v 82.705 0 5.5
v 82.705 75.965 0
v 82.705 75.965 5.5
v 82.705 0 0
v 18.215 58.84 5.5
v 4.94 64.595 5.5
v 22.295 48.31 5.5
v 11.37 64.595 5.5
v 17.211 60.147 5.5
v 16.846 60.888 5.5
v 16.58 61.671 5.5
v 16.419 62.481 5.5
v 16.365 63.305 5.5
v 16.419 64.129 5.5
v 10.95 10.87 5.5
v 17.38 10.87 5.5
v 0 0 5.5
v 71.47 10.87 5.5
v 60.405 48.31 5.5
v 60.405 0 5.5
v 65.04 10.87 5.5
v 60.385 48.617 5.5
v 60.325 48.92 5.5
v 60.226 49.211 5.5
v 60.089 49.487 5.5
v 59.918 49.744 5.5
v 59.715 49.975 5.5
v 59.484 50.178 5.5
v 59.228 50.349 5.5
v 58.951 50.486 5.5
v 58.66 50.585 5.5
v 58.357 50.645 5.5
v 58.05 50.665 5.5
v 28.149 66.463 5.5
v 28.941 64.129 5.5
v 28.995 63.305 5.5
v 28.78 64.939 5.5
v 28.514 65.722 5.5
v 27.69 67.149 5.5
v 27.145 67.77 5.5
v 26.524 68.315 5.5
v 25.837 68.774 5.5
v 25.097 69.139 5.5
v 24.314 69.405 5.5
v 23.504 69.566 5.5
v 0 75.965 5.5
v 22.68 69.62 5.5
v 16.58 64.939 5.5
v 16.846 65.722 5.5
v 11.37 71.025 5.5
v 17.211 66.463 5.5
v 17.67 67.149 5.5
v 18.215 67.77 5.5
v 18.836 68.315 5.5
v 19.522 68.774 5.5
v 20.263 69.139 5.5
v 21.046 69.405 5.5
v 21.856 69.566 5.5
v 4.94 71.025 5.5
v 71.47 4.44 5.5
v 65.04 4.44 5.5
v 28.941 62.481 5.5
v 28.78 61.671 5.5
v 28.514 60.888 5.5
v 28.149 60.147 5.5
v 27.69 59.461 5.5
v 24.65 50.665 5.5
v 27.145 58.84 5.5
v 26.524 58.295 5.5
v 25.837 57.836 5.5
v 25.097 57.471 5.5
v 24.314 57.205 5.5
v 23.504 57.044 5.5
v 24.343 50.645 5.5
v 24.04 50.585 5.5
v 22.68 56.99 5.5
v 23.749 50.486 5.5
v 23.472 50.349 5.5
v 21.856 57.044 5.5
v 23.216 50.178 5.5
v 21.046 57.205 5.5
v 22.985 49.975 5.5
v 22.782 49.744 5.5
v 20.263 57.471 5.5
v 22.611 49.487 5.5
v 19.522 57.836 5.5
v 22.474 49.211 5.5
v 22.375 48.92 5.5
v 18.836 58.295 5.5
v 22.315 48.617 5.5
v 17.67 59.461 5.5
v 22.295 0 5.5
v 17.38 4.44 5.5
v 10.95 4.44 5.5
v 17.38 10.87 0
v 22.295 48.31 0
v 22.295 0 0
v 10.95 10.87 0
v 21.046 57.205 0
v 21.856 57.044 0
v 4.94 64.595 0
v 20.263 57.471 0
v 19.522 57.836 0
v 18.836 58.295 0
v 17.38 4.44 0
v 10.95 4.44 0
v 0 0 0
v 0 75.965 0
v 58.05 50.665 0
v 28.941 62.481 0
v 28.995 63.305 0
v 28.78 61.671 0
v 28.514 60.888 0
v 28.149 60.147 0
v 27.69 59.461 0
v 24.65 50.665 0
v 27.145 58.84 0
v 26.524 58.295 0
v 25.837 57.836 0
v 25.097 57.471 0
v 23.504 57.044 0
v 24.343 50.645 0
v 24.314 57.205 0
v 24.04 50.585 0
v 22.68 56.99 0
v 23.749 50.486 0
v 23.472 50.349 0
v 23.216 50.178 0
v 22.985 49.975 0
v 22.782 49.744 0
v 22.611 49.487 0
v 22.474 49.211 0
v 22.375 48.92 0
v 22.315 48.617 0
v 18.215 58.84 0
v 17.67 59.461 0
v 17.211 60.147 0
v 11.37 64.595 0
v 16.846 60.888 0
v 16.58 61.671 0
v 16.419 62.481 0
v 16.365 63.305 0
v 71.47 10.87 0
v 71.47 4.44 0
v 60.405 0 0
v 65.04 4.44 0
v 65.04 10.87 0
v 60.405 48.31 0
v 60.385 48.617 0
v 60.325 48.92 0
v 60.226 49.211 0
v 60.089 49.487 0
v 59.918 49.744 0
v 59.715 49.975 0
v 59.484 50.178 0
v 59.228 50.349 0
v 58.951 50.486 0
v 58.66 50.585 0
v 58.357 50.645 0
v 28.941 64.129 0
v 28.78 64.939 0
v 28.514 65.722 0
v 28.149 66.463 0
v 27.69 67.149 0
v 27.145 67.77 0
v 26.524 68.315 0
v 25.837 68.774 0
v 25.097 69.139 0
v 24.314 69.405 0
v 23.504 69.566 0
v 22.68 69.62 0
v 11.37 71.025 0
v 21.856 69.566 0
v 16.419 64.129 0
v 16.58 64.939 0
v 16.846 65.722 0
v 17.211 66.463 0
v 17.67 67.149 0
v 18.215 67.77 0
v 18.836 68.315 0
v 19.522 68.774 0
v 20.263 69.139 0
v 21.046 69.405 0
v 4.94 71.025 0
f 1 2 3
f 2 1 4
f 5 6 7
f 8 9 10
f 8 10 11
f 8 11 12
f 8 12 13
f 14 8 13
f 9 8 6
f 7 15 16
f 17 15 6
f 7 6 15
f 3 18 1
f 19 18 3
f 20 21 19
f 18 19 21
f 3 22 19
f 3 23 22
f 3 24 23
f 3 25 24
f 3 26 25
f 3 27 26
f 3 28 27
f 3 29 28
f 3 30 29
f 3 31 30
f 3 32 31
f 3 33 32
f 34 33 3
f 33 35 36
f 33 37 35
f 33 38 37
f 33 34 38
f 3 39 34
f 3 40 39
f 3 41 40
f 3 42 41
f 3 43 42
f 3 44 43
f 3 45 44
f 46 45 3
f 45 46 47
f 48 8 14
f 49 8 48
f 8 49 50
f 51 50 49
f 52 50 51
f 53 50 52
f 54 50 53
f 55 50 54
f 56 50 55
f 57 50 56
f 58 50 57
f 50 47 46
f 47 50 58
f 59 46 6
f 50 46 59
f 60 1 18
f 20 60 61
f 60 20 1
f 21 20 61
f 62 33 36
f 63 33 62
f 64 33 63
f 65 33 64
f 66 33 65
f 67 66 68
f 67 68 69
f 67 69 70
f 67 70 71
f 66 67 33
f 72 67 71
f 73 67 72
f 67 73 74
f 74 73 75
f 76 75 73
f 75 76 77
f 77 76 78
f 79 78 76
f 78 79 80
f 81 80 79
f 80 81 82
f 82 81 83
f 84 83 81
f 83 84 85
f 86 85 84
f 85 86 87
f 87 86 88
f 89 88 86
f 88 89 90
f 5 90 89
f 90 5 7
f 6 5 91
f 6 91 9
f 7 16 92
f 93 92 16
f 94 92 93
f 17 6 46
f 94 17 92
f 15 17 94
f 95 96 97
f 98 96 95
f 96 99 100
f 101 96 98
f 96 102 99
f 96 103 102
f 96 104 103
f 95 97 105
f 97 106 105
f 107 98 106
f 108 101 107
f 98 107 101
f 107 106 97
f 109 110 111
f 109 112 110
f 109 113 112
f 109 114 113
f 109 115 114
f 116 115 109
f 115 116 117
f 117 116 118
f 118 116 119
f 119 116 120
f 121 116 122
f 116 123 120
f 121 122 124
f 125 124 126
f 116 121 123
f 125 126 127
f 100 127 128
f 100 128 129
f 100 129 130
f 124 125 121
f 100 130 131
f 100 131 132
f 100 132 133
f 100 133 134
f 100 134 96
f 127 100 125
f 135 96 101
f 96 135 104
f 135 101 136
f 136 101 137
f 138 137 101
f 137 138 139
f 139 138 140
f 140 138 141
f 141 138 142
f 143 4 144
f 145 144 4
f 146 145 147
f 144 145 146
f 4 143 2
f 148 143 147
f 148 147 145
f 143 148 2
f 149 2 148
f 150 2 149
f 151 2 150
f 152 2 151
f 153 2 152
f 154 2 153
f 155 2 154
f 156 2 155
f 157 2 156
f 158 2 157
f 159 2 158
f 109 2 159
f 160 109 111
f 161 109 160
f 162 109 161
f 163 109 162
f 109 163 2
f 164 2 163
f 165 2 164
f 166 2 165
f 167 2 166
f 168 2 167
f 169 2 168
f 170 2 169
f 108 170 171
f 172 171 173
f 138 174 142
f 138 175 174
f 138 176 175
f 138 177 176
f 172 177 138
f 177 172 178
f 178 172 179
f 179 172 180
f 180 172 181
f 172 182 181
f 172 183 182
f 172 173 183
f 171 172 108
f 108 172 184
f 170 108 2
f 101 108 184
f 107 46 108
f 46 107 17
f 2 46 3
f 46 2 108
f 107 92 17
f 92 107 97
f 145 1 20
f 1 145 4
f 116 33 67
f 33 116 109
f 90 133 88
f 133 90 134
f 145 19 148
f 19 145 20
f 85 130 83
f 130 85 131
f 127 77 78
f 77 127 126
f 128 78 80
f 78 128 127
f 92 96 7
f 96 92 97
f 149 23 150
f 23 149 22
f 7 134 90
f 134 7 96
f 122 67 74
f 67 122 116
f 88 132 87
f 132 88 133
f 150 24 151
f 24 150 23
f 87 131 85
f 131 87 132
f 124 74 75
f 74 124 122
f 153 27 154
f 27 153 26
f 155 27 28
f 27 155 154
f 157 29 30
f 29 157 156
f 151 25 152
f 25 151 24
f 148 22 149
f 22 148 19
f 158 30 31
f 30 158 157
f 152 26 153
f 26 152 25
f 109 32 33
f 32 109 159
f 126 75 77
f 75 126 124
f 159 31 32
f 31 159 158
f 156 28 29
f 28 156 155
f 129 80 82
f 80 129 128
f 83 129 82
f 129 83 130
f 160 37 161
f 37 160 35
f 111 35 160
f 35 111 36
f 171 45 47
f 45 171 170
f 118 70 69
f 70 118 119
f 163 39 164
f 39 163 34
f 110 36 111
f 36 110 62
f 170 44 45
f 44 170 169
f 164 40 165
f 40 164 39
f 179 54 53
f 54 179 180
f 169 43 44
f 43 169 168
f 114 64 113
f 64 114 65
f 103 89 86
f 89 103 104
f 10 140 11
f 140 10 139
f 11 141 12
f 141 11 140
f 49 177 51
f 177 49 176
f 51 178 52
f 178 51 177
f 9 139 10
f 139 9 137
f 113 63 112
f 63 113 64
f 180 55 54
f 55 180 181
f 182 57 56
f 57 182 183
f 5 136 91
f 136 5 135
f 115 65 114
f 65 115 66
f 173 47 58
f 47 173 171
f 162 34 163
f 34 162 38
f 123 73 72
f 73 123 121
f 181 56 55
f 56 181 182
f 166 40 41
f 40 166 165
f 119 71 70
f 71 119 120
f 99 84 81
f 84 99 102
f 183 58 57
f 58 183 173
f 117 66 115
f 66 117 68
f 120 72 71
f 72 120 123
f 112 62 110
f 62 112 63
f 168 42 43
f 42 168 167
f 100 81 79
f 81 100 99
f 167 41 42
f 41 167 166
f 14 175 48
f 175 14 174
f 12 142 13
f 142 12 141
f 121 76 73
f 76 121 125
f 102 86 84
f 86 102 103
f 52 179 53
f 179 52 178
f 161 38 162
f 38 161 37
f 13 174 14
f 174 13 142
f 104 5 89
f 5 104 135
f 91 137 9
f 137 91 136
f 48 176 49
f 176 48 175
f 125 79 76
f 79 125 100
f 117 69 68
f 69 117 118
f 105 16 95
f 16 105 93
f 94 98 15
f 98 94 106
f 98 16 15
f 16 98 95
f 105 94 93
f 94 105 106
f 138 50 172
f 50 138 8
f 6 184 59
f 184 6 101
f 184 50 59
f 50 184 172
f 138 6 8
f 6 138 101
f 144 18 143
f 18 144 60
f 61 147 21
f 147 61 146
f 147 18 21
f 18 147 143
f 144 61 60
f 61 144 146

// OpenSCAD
// Generated by SolidPython 1.0.2 on 2020-10-18 22:38:26
$fn = 48;


color(c = [1, 1, 1, 0.2000000000]) {
	difference() {
		cube(size = [82.7050000000, 75.9650000000, 5.5000000000]);
		hull() {
			translate(v = [24.6500000000, -2.3550000000, -0.5000000000]) {
				cylinder(center = false, h = 6.5000000000, r = 2.3550000000);
			}
			translate(v = [58.0500000000, -2.3550000000, -0.5000000000]) {
				cylinder(center = false, h = 6.5000000000, r = 2.3550000000);
			}
			translate(v = [24.6500000000, 48.3100000000, -0.5000000000]) {
				cylinder(center = false, h = 6.5000000000, r = 2.3550000000);
			}
			translate(v = [58.0500000000, 48.3100000000, -0.5000000000]) {
				cylinder(center = false, h = 6.5000000000, r = 2.3550000000);
			}
		}
		translate(v = [22.6800000000, 63.3050000000, -0.5000000000]) {
			cylinder(center = false, d = 12.6300000000, h = 6.5000000000);
		}
		translate(v = [10.9500000000, 4.4400000000, -0.0500000000]) {
			cube(size = [6.4300000000, 6.4300000000, 7]);
		}
		translate(v = [4.9400000000, 64.5950000000, -0.0500000000]) {
			cube(size = [6.4300000000, 6.4300000000, 7]);
		}
		translate(v = [65.0400000000, 4.4400000000, -0.0500000000]) {
			cube(size = [6.4300000000, 6.4300000000, 7]);
		}
	}
}
/***********************************************
*********      SolidPython code:      **********
************************************************
 
from solid import *
from solid.utils import *

SEGMENTS = 48
# Transparent = (1,    1,    1,   0.5)

def baseplate():
    gap_x = 76.22 / 2
    inch = 25.4
    arm1_x = 44.59 / 2
    arm2_x = 44.60 /2
    back_y = 50.60 /2
    arm_y = 101.33/2
    total_x = arm1_x + gap_x + arm2_x
    
    fill_r = 4.71 /2
    total_y = back_y + arm_y
    sensor_gx = 9.83 / 2
    sensor_gy = 8.88 /2
    ired_gx = 9.27 / 2
    ired_gy = 8.27 /2
    hole_d = 25.26 /2
    hole_gy = 12.69 /2
    hole_gx = 32.73 / 2
    junction_gx = 9.88 / 2
    junction_gy = 9.88 /2
    post_gx = 14.38 / 2
    post_gy = 17.31 /2
    thick = 6-0.5
    sensor_hw = 12.86/2
    junction_hw = 12.86/2
    ired_hw = 12.86/2
    
    # gap_remove = cube([gap_x, arm_y, thick+1])
    gap_remove = hull()( translate([arm1_x+fill_r,-fill_r,-0.5])(cylinder(r=fill_r, h= thick+1, center=False)),
                         translate([arm1_x+gap_x-fill_r, -fill_r,-0.5])(cylinder(r=fill_r, h= thick+1, center=False)),
                         translate([arm1_x+fill_r,arm_y-fill_r,-0.5])(cylinder(r=fill_r, h= thick+1, center=False)),
                         translate([arm1_x+gap_x-fill_r, arm_y-fill_r,-0.5])(cylinder(r=fill_r, h= thick+1, center=False))  )
                         
    body = cube([total_x, total_y, thick])
    led_hole = translate([hole_gx+hole_d/2, total_y-hole_gy-hole_d/2 , -0.5])(cylinder(d = hole_d, h = thick+1, center=False))
    sensor_hole = translate([arm1_x-sensor_hw-sensor_gx, sensor_gy, -.05])(cube([sensor_hw, sensor_hw, 6+1]))
    junction_hole = translate([junction_gx, total_y - junction_gy - junction_hw, -.05])(cube([sensor_hw, sensor_hw, 6+1]))
    ired_hole = translate([total_x-arm2_x+ired_gx, sensor_gy, -.05])(cube([sensor_hw, sensor_hw, 6+1]))
    
    body_mod = body - gap_remove - led_hole - sensor_hole - junction_hole - ired_hole
    return body_mod
    
if __name__ == '__main__':
    a = color(Transparent)(baseplate()) 
    scad_render_to_file(a, file_header=f'$fn = {SEGMENTS};', include_orig_code=True) 
 
************************************************/
